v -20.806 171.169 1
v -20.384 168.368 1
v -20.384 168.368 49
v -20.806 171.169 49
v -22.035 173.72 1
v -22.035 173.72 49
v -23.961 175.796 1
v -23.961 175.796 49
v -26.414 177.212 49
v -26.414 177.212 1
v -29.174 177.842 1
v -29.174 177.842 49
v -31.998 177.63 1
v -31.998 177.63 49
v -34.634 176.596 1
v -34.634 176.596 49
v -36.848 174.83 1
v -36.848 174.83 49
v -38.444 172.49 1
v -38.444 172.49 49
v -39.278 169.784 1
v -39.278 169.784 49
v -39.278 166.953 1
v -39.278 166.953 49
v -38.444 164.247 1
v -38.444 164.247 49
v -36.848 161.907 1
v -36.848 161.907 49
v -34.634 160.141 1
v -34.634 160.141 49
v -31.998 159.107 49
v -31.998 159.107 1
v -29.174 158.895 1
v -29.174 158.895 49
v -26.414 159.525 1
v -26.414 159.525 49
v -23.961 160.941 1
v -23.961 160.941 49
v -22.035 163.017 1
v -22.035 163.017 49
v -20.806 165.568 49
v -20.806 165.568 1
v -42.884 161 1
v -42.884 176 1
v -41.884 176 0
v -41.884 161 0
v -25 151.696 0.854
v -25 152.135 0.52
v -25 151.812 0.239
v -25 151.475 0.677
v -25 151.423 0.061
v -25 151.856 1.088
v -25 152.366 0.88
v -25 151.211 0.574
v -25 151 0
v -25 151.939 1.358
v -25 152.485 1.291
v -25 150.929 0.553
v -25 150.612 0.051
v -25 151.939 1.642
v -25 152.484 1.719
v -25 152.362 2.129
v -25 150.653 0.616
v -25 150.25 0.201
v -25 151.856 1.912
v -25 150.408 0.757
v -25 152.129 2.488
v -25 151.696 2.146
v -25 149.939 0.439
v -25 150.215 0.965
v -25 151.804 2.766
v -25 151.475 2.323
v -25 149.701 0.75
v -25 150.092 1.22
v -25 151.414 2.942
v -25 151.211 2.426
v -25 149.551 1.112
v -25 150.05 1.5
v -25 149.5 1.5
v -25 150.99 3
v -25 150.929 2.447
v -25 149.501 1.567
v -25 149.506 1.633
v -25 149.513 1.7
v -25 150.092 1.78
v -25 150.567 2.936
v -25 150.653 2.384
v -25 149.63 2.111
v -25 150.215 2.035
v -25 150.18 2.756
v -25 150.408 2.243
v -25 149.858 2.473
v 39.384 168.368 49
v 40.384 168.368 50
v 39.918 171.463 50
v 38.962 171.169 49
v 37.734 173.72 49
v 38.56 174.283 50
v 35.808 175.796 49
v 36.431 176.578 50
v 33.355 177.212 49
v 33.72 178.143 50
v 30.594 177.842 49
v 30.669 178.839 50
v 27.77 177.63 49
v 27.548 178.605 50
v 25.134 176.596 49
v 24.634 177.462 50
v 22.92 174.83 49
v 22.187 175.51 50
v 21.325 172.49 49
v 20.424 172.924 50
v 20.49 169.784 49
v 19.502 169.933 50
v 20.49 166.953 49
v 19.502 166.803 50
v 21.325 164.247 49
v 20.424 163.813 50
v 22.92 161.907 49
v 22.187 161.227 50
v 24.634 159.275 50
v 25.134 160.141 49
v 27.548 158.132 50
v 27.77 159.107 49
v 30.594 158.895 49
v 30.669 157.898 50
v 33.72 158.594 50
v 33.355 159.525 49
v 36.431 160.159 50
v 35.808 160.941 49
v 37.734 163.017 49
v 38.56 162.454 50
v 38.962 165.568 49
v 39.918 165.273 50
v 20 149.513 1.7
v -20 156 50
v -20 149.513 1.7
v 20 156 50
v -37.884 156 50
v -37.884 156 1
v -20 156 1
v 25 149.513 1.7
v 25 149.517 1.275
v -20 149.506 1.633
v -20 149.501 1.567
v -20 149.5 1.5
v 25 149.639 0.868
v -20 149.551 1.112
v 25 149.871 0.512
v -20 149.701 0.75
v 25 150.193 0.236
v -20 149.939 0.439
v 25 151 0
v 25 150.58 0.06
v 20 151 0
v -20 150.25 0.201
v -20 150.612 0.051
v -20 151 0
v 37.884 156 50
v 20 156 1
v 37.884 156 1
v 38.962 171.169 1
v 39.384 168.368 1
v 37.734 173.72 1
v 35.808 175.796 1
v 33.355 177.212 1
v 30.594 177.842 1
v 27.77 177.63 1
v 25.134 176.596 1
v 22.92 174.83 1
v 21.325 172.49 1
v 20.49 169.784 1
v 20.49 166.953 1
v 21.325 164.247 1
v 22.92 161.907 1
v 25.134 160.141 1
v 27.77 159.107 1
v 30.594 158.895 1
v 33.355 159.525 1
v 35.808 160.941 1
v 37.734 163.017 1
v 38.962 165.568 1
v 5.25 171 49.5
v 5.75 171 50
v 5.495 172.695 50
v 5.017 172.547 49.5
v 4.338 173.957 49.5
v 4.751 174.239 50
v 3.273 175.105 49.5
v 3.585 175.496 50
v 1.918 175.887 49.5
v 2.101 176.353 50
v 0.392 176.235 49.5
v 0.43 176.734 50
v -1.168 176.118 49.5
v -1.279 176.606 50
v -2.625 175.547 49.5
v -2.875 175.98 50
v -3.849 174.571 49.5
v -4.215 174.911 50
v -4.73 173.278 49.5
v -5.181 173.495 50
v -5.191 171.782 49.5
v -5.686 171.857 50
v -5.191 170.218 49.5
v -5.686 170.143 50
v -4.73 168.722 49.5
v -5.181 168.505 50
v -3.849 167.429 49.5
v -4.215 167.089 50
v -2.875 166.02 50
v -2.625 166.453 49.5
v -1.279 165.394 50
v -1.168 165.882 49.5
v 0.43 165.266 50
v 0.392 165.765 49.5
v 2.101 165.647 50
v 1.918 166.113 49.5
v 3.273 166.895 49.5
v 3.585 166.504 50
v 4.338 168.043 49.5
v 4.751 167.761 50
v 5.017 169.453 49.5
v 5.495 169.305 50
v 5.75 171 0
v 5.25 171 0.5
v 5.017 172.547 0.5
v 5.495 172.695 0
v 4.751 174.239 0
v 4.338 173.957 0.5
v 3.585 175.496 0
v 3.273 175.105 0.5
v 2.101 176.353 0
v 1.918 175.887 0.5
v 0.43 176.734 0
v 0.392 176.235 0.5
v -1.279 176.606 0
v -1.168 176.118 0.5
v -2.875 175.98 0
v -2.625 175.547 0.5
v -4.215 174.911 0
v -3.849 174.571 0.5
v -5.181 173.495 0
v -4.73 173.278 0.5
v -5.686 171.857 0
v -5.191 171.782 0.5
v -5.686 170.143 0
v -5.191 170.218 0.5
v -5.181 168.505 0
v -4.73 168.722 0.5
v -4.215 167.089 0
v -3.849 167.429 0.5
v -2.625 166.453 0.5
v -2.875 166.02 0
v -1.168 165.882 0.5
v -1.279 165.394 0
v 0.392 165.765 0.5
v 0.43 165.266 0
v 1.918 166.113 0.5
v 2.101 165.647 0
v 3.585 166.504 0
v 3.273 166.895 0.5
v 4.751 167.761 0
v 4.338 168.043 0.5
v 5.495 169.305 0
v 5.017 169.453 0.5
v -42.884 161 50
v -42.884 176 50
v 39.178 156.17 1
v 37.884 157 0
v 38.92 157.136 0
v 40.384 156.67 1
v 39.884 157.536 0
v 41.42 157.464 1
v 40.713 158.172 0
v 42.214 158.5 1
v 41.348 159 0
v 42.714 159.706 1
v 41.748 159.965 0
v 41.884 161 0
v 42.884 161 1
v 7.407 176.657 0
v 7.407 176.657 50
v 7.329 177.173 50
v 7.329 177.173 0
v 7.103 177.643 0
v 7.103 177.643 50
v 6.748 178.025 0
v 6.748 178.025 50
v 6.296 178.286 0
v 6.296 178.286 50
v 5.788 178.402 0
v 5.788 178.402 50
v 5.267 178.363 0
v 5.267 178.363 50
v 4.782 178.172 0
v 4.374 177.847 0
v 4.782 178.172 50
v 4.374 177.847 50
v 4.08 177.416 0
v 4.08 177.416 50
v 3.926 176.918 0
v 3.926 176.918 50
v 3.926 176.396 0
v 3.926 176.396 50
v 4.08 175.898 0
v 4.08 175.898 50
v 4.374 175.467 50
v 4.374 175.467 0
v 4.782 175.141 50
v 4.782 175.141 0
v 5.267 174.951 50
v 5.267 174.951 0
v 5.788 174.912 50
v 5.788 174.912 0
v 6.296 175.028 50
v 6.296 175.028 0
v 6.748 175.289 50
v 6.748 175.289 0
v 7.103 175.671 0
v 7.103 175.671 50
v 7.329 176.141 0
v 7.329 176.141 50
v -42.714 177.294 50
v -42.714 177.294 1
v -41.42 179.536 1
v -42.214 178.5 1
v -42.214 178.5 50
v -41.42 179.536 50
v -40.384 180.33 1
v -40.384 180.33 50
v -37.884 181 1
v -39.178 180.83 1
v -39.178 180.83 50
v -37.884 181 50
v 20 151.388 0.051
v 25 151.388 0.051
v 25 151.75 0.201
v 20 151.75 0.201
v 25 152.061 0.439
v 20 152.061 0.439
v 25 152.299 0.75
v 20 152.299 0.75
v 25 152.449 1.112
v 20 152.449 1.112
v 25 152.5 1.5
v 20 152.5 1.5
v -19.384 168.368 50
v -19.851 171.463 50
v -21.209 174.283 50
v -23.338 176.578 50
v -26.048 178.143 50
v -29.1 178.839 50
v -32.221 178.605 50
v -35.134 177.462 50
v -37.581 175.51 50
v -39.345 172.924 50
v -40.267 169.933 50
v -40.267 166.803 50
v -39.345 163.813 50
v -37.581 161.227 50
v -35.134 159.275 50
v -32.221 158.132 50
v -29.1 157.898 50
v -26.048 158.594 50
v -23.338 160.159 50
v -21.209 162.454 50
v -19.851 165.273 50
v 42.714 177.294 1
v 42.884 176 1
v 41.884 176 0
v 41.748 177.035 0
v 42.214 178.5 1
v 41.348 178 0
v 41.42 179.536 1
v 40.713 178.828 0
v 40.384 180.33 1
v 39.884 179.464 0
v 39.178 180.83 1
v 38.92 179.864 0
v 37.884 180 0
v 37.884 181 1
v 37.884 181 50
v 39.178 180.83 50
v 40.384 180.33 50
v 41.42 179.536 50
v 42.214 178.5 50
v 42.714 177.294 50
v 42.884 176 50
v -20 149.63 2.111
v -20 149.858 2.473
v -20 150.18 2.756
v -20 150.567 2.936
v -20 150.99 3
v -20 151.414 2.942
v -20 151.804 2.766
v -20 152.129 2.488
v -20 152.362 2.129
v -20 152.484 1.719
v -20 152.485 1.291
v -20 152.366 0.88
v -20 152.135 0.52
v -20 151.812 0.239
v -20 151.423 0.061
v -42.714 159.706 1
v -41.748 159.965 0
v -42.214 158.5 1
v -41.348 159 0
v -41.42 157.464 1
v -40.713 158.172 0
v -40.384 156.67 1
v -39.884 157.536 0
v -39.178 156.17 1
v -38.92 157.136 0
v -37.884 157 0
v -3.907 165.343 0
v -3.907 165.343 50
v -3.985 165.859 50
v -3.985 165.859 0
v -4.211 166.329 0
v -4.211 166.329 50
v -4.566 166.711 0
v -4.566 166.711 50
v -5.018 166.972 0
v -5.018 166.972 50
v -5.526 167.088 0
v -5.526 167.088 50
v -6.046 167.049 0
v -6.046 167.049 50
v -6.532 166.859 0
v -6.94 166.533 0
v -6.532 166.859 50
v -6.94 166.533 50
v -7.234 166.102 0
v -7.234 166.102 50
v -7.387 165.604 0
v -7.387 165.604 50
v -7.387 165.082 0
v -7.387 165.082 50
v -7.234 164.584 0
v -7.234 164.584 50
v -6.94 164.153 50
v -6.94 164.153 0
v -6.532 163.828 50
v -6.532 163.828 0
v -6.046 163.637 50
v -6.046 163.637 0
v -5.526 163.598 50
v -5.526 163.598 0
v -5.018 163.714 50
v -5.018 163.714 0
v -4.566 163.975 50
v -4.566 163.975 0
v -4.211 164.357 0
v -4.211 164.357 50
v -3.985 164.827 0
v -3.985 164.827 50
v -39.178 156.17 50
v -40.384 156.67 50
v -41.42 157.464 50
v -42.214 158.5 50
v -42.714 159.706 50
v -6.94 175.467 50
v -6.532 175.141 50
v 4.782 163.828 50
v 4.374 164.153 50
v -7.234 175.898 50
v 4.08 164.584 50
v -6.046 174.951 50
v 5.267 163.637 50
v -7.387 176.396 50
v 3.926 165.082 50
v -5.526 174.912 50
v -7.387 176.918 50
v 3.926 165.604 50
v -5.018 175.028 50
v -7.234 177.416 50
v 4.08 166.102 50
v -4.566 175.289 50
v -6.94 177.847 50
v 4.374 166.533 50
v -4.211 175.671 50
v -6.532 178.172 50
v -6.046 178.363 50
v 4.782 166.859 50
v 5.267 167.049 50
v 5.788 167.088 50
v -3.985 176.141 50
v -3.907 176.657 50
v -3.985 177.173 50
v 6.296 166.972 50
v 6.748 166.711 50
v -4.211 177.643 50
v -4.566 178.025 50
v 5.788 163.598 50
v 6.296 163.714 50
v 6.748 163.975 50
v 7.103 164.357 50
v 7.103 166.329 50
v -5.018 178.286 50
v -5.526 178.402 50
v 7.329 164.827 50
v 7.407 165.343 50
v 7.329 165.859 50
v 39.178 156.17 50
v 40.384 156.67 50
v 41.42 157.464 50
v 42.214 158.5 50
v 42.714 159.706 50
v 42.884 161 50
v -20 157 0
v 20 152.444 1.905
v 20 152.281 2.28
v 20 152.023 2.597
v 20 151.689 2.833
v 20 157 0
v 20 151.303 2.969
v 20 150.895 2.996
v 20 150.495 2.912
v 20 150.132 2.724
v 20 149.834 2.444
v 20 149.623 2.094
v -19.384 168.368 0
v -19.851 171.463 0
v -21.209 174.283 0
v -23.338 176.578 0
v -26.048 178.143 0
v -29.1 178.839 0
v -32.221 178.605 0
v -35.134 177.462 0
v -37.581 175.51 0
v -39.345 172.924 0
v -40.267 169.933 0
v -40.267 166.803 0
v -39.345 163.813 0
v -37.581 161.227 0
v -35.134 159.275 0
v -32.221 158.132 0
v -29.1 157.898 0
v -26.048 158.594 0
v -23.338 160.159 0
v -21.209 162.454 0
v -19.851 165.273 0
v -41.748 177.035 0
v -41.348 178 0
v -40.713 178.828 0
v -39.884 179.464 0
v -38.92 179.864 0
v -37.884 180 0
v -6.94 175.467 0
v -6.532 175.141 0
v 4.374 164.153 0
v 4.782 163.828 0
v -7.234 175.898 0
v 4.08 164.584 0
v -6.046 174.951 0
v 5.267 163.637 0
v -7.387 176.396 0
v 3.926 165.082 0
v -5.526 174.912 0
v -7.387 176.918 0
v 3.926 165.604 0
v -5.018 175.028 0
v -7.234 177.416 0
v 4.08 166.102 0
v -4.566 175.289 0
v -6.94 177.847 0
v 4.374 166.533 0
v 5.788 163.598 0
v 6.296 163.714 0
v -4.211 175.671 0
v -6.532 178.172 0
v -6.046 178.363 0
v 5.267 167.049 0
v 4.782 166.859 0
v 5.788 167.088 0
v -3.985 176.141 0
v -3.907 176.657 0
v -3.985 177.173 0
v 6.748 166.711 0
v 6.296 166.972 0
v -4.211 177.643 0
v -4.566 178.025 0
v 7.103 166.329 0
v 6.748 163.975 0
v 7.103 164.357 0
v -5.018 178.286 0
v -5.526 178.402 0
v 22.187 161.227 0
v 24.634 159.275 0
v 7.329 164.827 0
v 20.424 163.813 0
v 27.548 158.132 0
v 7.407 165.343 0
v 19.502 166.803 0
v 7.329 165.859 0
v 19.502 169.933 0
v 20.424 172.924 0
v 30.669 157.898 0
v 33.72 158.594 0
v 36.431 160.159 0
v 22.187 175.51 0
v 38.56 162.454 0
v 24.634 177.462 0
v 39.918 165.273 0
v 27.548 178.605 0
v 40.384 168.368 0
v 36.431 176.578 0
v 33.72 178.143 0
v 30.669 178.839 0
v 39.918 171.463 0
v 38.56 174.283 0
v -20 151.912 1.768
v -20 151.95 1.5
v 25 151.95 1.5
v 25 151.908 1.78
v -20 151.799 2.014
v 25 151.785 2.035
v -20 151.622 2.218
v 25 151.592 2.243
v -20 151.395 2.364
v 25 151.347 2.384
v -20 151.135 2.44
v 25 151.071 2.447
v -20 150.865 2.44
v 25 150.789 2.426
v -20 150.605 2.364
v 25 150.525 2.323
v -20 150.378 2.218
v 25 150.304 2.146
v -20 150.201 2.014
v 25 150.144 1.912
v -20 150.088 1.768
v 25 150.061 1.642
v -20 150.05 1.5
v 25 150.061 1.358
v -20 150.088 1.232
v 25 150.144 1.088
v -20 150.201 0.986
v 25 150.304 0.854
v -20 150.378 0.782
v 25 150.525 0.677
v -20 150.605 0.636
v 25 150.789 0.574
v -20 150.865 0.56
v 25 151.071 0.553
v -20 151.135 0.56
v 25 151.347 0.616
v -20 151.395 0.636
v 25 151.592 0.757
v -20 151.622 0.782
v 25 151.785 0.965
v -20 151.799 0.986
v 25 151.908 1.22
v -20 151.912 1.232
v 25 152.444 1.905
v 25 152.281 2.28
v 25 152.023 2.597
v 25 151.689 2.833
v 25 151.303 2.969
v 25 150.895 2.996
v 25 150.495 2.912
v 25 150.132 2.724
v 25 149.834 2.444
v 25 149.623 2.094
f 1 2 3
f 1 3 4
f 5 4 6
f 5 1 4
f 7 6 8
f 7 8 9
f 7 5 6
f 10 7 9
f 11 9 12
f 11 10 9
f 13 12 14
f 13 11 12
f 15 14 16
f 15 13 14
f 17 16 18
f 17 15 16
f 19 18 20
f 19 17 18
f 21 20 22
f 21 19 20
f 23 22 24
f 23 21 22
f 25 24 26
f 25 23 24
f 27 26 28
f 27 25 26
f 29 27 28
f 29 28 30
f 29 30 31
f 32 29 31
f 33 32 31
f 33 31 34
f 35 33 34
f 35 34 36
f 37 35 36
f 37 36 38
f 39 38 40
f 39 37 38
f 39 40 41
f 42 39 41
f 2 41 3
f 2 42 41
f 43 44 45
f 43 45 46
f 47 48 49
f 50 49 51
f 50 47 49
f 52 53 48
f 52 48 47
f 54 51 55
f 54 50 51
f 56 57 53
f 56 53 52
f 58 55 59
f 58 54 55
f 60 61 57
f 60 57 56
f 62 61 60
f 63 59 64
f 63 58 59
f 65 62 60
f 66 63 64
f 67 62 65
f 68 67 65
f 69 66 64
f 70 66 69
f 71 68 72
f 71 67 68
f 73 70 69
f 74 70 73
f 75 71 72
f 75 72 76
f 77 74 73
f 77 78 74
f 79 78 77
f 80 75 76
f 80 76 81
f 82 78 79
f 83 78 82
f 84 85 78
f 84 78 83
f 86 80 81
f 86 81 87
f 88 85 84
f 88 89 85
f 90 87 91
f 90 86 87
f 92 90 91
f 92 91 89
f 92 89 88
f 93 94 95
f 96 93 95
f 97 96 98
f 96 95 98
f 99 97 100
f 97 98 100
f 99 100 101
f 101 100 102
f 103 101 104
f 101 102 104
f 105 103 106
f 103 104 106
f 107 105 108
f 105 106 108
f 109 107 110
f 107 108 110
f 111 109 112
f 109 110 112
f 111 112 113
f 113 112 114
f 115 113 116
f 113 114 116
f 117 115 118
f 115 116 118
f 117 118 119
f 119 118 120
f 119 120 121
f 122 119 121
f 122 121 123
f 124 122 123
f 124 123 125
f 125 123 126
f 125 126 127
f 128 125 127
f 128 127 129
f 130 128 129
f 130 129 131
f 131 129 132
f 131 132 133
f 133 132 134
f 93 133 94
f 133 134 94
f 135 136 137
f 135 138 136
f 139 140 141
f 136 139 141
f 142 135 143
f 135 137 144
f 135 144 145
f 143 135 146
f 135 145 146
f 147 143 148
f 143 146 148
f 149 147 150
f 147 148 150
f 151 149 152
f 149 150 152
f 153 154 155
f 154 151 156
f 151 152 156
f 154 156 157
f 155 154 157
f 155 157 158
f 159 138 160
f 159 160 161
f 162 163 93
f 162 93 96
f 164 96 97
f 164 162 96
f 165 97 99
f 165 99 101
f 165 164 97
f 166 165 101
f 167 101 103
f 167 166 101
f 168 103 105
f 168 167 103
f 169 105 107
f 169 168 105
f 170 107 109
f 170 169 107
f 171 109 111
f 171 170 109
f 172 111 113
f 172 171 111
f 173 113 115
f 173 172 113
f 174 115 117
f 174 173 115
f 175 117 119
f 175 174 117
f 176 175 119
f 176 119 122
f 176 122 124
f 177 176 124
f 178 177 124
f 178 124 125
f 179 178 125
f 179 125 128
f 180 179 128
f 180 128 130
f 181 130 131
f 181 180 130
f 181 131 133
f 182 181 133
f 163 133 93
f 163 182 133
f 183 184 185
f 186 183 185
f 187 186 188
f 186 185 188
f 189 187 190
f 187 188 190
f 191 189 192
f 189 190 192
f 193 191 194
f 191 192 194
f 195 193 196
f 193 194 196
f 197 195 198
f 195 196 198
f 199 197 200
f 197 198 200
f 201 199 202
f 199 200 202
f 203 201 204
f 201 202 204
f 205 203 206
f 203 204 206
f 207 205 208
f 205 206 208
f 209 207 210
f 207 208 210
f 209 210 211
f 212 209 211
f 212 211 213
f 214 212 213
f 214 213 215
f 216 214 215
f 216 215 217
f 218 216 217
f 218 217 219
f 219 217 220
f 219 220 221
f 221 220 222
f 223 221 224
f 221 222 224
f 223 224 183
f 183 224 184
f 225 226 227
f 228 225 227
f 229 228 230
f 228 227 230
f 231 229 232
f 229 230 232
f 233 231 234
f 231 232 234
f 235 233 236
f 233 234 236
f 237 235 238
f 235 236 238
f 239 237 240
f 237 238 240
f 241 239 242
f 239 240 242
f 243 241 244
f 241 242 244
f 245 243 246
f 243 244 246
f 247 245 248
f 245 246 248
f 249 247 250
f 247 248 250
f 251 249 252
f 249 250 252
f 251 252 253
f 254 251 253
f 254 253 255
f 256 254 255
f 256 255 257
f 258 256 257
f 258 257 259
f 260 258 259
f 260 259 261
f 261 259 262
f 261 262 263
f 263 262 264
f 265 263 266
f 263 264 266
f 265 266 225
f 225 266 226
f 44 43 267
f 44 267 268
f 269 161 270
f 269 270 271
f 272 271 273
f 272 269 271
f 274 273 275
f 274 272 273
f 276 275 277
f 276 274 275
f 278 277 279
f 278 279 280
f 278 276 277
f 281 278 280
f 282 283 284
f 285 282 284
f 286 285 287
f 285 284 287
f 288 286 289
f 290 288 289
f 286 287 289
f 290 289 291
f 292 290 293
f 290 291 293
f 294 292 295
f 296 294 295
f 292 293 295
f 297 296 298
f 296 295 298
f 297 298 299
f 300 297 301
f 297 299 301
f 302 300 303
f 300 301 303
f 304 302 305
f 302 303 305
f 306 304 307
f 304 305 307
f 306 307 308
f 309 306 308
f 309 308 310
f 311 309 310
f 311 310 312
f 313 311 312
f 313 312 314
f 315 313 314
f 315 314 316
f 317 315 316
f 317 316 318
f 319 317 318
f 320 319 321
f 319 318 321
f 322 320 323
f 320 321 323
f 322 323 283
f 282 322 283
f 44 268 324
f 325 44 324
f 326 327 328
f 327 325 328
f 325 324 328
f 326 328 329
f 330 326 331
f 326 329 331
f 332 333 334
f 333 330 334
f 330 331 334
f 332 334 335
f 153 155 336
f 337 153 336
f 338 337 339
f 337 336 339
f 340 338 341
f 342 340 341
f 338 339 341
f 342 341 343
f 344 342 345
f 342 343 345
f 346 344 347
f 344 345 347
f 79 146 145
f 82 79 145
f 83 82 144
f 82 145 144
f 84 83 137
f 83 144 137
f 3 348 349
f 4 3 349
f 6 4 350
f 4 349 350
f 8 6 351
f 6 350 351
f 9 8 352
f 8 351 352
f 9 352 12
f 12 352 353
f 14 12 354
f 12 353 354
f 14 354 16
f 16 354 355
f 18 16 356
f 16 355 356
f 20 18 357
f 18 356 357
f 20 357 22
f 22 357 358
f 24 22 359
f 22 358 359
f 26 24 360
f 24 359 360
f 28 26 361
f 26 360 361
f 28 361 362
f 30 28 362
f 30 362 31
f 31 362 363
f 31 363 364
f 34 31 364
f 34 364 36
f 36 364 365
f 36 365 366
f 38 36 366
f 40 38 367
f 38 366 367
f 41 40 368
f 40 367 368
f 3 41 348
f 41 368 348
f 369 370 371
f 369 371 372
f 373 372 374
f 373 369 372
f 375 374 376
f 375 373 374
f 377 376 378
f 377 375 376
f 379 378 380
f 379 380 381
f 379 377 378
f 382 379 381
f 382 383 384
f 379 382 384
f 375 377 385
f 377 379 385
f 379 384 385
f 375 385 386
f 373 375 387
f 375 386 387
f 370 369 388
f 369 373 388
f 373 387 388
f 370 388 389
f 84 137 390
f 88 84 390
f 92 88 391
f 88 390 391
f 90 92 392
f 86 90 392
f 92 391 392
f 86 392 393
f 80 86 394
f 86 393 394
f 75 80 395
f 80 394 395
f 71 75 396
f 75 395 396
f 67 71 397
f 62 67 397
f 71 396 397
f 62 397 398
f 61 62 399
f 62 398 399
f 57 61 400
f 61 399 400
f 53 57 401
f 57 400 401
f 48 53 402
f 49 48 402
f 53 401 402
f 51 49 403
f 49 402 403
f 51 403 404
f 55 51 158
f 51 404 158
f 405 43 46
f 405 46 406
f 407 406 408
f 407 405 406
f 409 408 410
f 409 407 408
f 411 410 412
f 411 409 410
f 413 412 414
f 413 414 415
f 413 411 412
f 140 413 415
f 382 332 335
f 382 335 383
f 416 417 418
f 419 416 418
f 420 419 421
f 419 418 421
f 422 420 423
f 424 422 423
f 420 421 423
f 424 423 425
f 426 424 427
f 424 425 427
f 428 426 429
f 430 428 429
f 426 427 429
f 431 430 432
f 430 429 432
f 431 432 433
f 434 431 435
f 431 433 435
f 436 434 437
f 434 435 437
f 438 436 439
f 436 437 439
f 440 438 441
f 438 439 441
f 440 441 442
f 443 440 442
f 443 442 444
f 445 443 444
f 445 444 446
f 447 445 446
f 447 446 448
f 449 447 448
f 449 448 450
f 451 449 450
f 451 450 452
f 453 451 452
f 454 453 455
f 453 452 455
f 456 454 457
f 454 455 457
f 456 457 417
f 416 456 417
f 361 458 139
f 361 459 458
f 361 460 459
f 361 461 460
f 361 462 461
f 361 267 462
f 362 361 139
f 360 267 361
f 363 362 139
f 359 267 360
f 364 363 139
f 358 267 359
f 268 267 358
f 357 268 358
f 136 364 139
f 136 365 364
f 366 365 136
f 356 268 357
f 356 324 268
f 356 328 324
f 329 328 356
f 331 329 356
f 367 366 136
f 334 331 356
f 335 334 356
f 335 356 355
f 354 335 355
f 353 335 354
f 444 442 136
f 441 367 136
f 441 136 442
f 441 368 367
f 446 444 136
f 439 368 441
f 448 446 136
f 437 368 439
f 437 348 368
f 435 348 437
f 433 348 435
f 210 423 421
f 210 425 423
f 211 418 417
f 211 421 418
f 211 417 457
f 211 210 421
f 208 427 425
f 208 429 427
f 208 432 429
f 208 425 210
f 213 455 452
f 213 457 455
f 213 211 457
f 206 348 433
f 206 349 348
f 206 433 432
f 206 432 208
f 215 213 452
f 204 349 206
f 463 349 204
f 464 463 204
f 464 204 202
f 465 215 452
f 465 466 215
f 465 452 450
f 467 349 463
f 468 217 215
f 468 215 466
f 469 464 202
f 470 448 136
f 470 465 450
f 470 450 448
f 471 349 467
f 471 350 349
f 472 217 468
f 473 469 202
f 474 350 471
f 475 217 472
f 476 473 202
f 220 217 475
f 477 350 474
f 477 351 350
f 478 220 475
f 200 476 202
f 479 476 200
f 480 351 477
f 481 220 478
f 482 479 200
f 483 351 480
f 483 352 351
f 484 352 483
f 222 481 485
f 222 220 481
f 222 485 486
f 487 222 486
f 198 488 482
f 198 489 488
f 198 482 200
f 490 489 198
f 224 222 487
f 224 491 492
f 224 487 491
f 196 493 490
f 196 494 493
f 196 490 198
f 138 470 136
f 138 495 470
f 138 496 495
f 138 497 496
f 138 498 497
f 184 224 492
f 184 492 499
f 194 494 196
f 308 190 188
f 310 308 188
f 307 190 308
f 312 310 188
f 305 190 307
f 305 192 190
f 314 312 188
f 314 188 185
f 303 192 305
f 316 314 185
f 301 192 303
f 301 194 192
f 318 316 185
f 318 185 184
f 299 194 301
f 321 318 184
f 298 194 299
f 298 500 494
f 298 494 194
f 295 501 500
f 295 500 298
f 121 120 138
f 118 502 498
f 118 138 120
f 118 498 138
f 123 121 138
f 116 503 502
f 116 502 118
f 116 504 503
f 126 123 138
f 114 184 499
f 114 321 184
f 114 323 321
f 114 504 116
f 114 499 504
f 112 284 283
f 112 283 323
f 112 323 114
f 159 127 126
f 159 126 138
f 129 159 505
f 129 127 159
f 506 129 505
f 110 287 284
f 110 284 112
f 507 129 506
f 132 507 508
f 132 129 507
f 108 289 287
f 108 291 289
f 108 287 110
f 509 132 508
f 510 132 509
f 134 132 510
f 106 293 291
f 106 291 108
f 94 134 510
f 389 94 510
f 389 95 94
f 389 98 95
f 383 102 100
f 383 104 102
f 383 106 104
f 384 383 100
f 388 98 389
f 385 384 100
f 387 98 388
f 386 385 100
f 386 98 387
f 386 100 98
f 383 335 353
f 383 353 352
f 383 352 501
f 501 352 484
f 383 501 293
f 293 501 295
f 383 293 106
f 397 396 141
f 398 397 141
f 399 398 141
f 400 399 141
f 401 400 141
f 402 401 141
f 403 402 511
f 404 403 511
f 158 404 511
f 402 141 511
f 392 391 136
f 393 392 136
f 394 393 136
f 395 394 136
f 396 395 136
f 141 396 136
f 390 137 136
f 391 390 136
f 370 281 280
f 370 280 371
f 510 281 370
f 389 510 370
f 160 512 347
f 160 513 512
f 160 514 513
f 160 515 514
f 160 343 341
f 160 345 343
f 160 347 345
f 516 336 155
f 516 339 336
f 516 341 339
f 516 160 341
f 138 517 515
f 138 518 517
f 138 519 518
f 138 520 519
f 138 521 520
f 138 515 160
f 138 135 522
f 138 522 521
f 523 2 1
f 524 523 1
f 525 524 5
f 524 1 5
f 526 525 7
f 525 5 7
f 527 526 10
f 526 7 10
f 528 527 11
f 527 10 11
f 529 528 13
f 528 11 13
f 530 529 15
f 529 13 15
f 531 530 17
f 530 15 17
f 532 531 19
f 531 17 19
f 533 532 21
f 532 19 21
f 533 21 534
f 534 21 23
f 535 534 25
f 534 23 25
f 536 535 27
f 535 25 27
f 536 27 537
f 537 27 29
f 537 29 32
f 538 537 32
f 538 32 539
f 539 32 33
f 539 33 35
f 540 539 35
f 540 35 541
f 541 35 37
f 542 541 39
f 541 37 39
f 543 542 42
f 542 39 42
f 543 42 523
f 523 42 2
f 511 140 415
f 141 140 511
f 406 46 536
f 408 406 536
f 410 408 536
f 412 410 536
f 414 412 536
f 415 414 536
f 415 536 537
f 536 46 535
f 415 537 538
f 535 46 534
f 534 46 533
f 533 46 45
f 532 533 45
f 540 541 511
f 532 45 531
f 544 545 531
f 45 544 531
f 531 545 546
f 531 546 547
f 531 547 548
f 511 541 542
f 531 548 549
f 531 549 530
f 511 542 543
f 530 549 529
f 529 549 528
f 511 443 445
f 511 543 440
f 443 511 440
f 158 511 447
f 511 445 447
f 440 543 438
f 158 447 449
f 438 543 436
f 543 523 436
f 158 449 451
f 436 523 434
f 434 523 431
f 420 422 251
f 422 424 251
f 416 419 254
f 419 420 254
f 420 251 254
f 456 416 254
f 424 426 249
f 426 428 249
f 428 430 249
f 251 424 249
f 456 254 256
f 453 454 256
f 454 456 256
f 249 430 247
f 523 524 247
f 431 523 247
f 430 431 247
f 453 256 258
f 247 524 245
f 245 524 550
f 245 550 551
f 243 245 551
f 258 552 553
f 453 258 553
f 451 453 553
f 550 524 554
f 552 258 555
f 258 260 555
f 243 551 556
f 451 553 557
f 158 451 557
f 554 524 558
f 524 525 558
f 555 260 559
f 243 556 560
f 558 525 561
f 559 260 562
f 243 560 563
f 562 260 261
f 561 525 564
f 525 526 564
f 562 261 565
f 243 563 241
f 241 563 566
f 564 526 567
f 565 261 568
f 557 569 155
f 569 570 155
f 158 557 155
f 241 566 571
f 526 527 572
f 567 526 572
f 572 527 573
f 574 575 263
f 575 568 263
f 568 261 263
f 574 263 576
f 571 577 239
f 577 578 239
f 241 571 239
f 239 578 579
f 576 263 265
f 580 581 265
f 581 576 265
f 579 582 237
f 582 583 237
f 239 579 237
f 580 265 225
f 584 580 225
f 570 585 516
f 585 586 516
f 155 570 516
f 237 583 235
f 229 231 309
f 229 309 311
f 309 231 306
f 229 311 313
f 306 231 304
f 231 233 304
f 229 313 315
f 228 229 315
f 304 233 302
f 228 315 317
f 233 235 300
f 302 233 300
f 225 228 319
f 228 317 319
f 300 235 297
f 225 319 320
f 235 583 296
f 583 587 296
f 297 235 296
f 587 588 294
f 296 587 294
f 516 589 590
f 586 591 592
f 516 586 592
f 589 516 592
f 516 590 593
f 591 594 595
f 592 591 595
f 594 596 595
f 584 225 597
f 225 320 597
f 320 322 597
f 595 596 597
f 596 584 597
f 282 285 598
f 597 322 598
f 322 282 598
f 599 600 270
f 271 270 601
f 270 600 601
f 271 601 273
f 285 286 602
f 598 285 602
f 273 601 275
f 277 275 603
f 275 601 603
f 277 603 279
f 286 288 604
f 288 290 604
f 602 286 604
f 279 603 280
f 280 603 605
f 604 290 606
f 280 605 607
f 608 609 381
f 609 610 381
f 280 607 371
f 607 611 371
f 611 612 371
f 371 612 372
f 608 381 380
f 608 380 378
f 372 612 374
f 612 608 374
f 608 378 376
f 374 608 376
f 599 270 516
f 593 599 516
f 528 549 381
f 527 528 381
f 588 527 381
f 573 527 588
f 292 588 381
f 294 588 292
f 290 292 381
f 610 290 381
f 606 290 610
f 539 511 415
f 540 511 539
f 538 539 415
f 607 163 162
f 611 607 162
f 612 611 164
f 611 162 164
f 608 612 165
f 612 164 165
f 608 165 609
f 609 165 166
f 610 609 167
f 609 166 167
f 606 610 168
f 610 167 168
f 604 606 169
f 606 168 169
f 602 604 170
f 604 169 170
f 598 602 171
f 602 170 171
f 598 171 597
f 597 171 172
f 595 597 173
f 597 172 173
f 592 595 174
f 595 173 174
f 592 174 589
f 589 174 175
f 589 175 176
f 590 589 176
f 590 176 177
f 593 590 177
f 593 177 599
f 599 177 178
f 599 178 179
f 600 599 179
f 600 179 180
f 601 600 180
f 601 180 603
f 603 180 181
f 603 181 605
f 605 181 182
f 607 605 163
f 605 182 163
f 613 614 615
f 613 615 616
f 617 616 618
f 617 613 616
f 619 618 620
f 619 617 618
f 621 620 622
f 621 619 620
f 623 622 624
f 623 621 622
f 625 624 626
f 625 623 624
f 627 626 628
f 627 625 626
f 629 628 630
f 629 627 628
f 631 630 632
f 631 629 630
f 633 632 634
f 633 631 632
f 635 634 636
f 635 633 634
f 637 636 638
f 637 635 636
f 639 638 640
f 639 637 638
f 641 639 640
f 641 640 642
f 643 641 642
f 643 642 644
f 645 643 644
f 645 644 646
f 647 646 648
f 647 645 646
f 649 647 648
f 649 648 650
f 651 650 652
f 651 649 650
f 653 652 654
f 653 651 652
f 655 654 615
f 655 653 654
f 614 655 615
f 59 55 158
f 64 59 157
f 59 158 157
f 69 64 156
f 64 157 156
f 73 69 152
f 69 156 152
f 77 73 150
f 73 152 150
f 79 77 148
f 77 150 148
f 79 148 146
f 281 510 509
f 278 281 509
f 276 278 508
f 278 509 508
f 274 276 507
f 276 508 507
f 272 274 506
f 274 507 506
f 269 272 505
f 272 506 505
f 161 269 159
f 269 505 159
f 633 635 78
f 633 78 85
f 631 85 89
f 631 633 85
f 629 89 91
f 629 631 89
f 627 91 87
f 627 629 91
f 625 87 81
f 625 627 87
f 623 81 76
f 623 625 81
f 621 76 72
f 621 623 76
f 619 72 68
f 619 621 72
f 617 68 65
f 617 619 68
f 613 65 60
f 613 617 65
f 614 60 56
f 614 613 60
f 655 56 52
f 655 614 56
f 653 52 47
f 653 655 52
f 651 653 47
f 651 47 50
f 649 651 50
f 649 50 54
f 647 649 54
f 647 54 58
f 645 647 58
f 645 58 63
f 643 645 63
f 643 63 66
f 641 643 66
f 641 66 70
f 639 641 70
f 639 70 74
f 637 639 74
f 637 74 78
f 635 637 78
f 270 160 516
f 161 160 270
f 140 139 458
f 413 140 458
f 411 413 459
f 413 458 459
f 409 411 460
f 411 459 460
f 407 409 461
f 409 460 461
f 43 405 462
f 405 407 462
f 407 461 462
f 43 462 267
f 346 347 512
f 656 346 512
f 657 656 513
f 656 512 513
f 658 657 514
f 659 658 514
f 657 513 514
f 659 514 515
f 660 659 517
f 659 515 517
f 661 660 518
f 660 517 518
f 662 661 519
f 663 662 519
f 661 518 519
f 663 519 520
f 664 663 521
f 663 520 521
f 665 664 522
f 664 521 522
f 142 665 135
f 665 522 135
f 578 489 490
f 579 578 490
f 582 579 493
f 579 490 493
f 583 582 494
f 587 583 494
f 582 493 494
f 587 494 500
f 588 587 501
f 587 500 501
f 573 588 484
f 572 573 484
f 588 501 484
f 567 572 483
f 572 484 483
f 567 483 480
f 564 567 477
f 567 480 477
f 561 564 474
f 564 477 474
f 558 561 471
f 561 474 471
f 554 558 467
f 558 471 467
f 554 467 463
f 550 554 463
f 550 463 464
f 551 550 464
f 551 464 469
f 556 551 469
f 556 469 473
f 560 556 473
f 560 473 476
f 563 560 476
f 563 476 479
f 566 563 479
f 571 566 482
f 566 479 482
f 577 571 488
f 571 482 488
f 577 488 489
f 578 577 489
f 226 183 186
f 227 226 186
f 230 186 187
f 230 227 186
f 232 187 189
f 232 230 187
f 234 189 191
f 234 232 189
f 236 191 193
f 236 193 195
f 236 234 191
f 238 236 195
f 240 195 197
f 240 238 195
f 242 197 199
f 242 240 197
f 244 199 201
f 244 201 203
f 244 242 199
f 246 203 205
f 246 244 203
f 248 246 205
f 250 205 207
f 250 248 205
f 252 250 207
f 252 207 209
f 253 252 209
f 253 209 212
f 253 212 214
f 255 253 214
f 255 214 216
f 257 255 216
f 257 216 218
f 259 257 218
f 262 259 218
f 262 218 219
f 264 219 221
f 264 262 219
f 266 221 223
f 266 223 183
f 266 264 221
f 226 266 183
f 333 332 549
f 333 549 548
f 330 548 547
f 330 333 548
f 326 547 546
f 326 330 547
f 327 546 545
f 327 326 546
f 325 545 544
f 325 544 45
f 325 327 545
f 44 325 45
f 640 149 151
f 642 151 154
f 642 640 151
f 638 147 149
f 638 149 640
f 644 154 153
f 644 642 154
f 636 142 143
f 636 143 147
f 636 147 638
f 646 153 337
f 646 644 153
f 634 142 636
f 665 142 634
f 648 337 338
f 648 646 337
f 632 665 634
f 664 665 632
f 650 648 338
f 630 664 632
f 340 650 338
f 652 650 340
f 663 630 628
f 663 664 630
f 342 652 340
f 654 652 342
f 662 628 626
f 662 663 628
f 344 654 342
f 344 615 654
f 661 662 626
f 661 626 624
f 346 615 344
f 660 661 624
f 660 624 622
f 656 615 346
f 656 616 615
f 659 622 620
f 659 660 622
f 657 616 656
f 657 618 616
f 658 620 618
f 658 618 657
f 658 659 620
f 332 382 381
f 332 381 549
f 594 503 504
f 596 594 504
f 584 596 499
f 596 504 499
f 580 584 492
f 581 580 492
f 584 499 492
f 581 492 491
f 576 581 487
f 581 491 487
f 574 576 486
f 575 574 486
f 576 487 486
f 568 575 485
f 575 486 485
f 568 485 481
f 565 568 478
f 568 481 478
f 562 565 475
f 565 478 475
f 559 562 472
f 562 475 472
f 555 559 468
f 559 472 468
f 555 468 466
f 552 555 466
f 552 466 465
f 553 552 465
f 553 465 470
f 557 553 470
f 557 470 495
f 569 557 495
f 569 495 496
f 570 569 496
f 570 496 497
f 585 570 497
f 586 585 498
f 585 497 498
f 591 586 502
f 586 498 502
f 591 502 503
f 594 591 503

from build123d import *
from build123d import SkipClean  # not in build123d's __all__

# Parameters (mm, degrees)
F0_W      = 85.7687139645
F0_H      = 25
F0_R      = 9.5
F0_R_2    = 5.25
F1_DEPTH  = 50
F3_R      = 0.95
F4_DEPTH  = 20
F5_R      = 0.95
F6_DEPTH  = 5
F7_R      = 0.95
F8_DEPTH  = 5
F9_R      = 1.75
F10_DEPTH = 50
F11_R     = 5
F12_SIZE  = 1
F13_SIZE  = 0.5
F14_SIZE  = 1


# Not quite as in the source:
# - after a boolean that leaves OpenCascade's solid faulty, fix() repairs it


with BuildPart() as f1:
    # F0 (on Top) → F1 (new body)
    with BuildSketch(Plane.XY):
        with Locations((0, 168.5)):
            Rectangle(F0_W, F0_H)
        with Locations((-29.8843569823, 168.3684210526)):
            Circle(F0_R, mode=Mode.SUBTRACT)
        with Locations((29.8843569823, 168.3684210526)):
            Circle(F0_R, mode=Mode.SUBTRACT)
        with Locations((0, 171)):
            Circle(F0_R_2, mode=Mode.SUBTRACT)
    extrude(amount=F1_DEPTH)

    # F3 (on mid) → F4 (join, symmetric)
    with BuildSketch(Plane.YZ):
        with BuildLine():
            Line((156, 50), (149.5133467482, 1.6996549744))
            ThreePointArc((149.5133467482, 1.6996549744), (149.8709556117, 0.5124480929), (151, 0))
            Line((151, 0), (156, 0))
            Line((156, 0), (156, 50))
        make_face()
        with Locations((151, 1.5)):
            Circle(F3_R, mode=Mode.SUBTRACT)
    extrude(amount=F4_DEPTH, both=True)

    # F5 (on face) → F6 (join)
    with BuildSketch(Plane.YZ.offset(20)):
        with BuildLine():
            ThreePointArc((151, 0), (152.0606601718, 0.4393398282), (152.5, 1.5))
            ThreePointArc((152.5, 1.5), (151.100050293, 2.9966595935), (149.5133467482, 1.6996549744))
            ThreePointArc((149.5133467482, 1.6996549744), (149.8709556117, 0.5124480929), (151, 0))
        make_face()
        with Locations((151, 1.5)):
            Circle(F5_R, mode=Mode.SUBTRACT)
    extrude(amount=F6_DEPTH)

    # F7 (on face) → F8 (join)
    with BuildSketch(Plane(origin=(-20, 0, 0), x_dir=(0, -1, 0), z_dir=(-1, 0, 0))):
        with BuildLine():
            ThreePointArc((-151, 0), (-149.9393398282, 0.4393398282), (-149.5, 1.5))
            ThreePointArc((-149.5, 1.5), (-149.5033404065, 1.600050293), (-149.5133467482, 1.6996549744))
            ThreePointArc((-149.5133467482, 1.6996549744), (-152.1290443883, 2.4875519071), (-151, 0))
        make_face()
        with Locations((-151, 1.5)):
            Circle(F7_R, mode=Mode.SUBTRACT)
    with SkipClean():  # cleaning this boolean's faces spoils the solid; the shape is the same uncleaned
        extrude(amount=F8_DEPTH)

    # F9 (on face) → F10 (cut, through all)
    with BuildSketch(Plane.XY.offset(50)):
        with Locations((5.6568542495, 176.6568542495)):
            Circle(F9_R)
        with Locations((-5.6568542495, 176.6568542495)):
            Circle(F9_R)
        with Locations((-5.6568542495, 165.3431457505)):
            Circle(F9_R)
        with Locations((5.6568542495, 165.3431457505)):
            Circle(F9_R)
    extrude(amount=-F10_DEPTH, mode=Mode.SUBTRACT)

    add(f1.part.fix(), mode=Mode.REPLACE)

    # F11
    f11_edges = [f1.edges().sort_by_distance(p)[0] for p in [
        (42.884357, 156, 25),
        (42.884357, 181, 25),
        (-42.884357, 181, 25),
        (-42.884357, 156, 25),
    ]]
    fillet(f11_edges, radius=F11_R)

    # F12
    f12_edges = [f1.edges().sort_by_distance(p)[0] for p in [
        (20.384357, 168.368421, 50),
        (-39.384357, 168.368421, 50),
        (20.384357, 168.368421, 0),
        (-39.384357, 168.368421, 0),
    ]]
    chamfer(f12_edges, length=F12_SIZE)

    # F13
    f13_edges = [f1.edges().sort_by_distance(p)[0] for p in [
        (-5.25, 171, 50),
        (-5.25, 171, 0),
    ]]
    chamfer(f13_edges, length=F13_SIZE)

    # F14
    f14_edges = [f1.edges().sort_by_distance(p)[0] for p in [
        (-28.942178, 156, 0),
        (-41.419891, 157.464466, 0),
        (42.884357, 168.5, 0),
        (41.419891, 157.464466, 0),
        (41.419891, 179.535534, 0),
        (28.942178, 156, 0),
        (0, 181, 0),
        (-41.419891, 179.535534, 0),
        (-42.884357, 168.5, 0),
    ]]
    chamfer(f14_edges, length=F14_SIZE)


solid = f1.part
